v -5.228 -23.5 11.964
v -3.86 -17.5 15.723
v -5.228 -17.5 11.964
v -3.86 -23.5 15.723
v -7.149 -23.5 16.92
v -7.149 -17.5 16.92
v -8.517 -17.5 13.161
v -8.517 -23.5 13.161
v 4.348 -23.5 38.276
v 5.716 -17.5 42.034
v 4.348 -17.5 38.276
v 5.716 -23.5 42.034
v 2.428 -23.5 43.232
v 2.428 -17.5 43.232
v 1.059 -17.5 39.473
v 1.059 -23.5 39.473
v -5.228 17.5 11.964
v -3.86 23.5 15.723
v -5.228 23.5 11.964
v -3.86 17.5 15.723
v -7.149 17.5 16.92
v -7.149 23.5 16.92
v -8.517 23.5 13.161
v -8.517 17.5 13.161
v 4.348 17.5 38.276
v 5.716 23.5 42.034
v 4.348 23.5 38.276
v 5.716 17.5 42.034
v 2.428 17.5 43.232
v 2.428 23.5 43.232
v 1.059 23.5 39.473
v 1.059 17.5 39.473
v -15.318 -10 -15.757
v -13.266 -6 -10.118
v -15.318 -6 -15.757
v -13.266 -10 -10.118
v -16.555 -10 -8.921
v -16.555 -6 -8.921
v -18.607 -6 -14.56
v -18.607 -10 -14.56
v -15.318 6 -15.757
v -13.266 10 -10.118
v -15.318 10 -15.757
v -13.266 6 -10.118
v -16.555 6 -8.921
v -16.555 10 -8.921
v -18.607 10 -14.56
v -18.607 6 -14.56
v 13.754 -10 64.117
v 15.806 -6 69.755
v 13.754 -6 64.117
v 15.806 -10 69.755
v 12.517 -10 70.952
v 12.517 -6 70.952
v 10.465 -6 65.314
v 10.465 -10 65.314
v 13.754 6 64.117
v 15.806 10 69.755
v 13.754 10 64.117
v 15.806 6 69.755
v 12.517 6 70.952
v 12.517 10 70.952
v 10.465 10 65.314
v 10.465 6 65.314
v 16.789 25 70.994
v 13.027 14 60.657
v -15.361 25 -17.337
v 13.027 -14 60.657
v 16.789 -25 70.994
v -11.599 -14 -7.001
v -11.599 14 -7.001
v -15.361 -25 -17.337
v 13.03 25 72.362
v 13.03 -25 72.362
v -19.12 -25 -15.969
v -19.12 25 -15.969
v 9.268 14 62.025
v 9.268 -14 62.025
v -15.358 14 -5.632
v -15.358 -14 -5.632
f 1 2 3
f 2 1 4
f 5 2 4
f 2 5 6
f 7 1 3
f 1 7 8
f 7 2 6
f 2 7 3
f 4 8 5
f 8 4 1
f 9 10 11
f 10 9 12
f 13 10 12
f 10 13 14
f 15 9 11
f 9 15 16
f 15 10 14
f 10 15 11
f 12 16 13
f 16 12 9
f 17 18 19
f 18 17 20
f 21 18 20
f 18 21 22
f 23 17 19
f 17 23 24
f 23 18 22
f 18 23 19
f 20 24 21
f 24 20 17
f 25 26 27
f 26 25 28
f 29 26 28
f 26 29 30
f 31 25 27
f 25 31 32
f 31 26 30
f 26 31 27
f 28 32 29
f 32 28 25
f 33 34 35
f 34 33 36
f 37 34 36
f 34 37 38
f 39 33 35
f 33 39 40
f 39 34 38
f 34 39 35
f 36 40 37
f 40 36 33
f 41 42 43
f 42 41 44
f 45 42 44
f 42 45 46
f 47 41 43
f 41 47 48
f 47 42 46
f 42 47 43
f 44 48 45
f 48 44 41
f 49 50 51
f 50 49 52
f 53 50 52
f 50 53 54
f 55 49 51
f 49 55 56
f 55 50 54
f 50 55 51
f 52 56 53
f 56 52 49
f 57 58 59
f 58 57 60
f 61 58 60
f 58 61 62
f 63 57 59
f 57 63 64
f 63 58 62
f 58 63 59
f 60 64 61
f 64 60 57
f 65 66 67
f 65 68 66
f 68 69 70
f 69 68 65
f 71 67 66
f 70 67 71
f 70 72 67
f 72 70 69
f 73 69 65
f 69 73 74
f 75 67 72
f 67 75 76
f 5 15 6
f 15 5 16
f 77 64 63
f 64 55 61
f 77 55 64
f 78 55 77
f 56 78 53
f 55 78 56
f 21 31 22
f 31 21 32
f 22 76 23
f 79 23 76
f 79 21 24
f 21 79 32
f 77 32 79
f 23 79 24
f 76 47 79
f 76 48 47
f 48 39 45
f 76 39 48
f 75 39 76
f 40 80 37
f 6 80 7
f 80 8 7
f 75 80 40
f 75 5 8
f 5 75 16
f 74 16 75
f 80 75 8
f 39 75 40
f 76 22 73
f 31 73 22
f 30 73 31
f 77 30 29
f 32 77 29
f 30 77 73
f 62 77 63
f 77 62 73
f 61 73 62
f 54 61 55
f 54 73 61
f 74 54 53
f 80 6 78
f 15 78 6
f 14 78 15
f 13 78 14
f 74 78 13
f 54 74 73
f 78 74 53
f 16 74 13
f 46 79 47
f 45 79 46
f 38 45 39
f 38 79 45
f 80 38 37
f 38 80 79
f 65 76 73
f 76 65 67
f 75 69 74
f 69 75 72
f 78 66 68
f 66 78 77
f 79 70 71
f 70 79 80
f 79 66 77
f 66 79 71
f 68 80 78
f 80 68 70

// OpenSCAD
// 80 mm case fan -> 72 x 28 mm right-angle duct adapter
//
// Axis convention (matches request)
//   - Fan mounts to the flange in the XY plane at z = 0, air enters along +Z.
//   - The 90 degree turn is in the XZ plane, so the bend axis is Y.
//   - The 28 mm outlet side is parallel to that bend axis (Y).
//   - The 72 mm outlet side is the in-plane/radial dimension (Z at the outlet).
//   - Air exits along -X.
//
// The duct itself is one watertight polyhedron: outer skin + inner skin +
// annular caps. No boolean is needed to hollow it. The fan flange and outlet
// rim are simple CSG boxes added afterwards.

$fn = 64;

// ---------------- parameters ----------------
fan_hole_pitch = 71.5;   // standard 80 mm fan hole spacing
fan_hole_d     = 4.5;    // M4 clearance
fan_pad_r      = 6.5;    // corner pads so the M4 holes have material around them
fan_tie_w      = 6.0;    // zip-tie slot width
fan_tie_l      = 4.0;    // zip-tie slot length (1 mm web each side of flange)
fan_tie_pos    = 41.0;   // slot center distance from flange center
fan_tie_pair   = 9.0;    // ± offset of the two slots on each flange side

inlet_clear   = 76;      // clear square throat at fan
wall          = 2.0;     // duct wall thickness (5 perimeters at 0.4 mm nozzle)

flange_t      = 5;       // fan flange thickness
flange_outer  = 88;      // fan flange outer size

// M3 pilot holes for self-tapping screws in the fan corner pads (alternative
// to zip ties). Set to 0 to remove them.
fan_pilot_d       = 2.6;
fan_pilot_offset  = 4.8; // distance from M4 hole center, toward the flange edge

out_radial    = 72;      // outlet clear dim in bend plane (Z at outlet)
out_axis      = 28;      // outlet clear dim along bend axis (Y)
out_lip       = 10;      // straight run after arc

center_r      = 55;      // centerline bend radius
lead_in       = 12;      // vertical lead before arc
bend_angle    = 70;      // 90 - trim; stop 20 deg early -> min slope ~20 deg

rim_t         = 3;       // outlet rim thickness
rim_extra     = 9;       // rim overhang per side (gives 1.5 mm web around 6 mm slots)
rim_tie_pair_z = 14;     // ± Z offset of tie slots on the Y-side tabs
rim_tie_pair_y = 8;      // ± Y offset of tie slots on the Z-side tabs

n_straight    = 4;
n_bend        = 32;
n_out         = 4;
taper_exp     = 1.5;     // >1 keeps section large deeper into the bend

// ---------------- derived ----------------
in_half    = inlet_clear/2;
out_r_half = out_radial/2;
out_a_half = out_axis/2;

z_start   = flange_t - 1 + lead_in;   // arc start (duct overlaps flange)
th_end    = bend_angle * 3.14159265/180;
arc_end_x = -center_r + center_r*cos(th_end);
arc_end_z = z_start + center_r*sin(th_end);
outlet_x  = arc_end_x - out_lip*sin(th_end);
outlet_z  = arc_end_z + out_lip*cos(th_end);
rim_rot   = 90 - bend_angle;          // rim frame rotation about Y

// ---------------- path ----------------
// Section = [cx, cz, nx, nz, half_radial, half_axis]
// (nx,nz) = in-plane radial unit vector; tangent = (-nz, nx).
function path_sections(n) = [
    for (i=[0:n])
    let (
        ns=n_straight, nb=n_bend, no=n_out,
        seg = i < ns ? 0 : (i < ns+nb ? 1 : 2),
        u   = seg==0 ? i/ns : (seg==1 ? (i-ns)/nb : (i-ns-nb)/no),
        th  = seg==0 ? 0 : (seg==1 ? u*bend_angle : bend_angle),
        cx  = seg==0 ? 0
            : seg==1 ? -center_r + center_r*cos(th)
            : arc_end_x - out_lip*sin(th_end)*u,
        cz  = seg==0 ? z_start - lead_in*(1-u)
            : seg==1 ? z_start + center_r*sin(th)
            : arc_end_z + out_lip*cos(th_end)*u,
        nx  = seg==0 ? 1 : (seg==1 ? cos(th) : cos(th_end)),
        nz  = seg==0 ? 0 : (seg==1 ? sin(th) : sin(th_end)),
        g   = pow(u_global(i,ns,nb,no,n), taper_exp),
        hr  = in_half + (out_r_half - in_half)*g,
        ha  = in_half + (out_a_half - in_half)*g
    )
    [cx, cz, nx, nz, hr, ha]
];

function u_global(i,ns,nb,no,n) = i/n;

function corner(s,a,b,off) =
    [ s[0] + s[2]*a*(s[4]+off),
      b*(s[5]+off),
      s[1] + s[3]*a*(s[4]+off) ];

function ring_verts(sec,off) = [
    for (s=sec) each [
        corner(s,-1,-1,off), corner(s, 1,-1,off),
        corner(s, 1, 1,off), corner(s,-1, 1,off)
    ]
];

// Explicit triangles: non-planar quads on a curved path are triangulated here
// instead of relying on polyhedron's internal triangulation.
function tri_quad(a,b,c,d) = [[a,b,c],[a,c,d]];
function tri_quad_rev(a,b,c,d) = [[a,c,b],[a,d,c]];

function outer_faces(nr) = [
    for (i=[0:nr-2], j=[0:3])
    let (a=4*i+j, b=4*i+(j+1)%4,
         c=4*(i+1)+(j+1)%4, d=4*(i+1)+j)
    each tri_quad(a,b,c,d)
];

function inner_faces(nr) = [
    for (i=[0:nr-2], j=[0:3])
    let (o=4*nr, a=o+4*i+j, b=o+4*i+(j+1)%4,
         c=o+4*(i+1)+(j+1)%4, d=o+4*(i+1)+j)
    each tri_quad_rev(a,b,c,d)
];

function cap_faces(nr) = [
    for (j=[0:3])
    let (j2=(j+1)%4, o=4*nr,
         last=4*(nr-1), olast=o+last)
    each concat(
        tri_quad(o+j, o+j2, j2, j),              // inlet annulus, normal -t
        tri_quad(last+j, last+j2, olast+j2, olast+j)  // outlet annulus, +t
    )
];

module hollow_duct(sec) {
    nr = len(sec);
    polyhedron(
        concat(ring_verts(sec, wall), ring_verts(sec, 0)),
        concat(outer_faces(nr), inner_faces(nr), cap_faces(nr)),
        convex=false
    );
}

// ---------------- flange and rim ----------------
module fan_flange_base() {
    // Flange plate with the square throat cut out. Pads are added afterwards
    // so the mounting holes at the corners have material around them.
    difference() {
        translate([0,0,flange_t/2])
            cube([flange_outer, flange_outer, flange_t], center=true);
        translate([0,0,-1])
            cube([inlet_clear, inlet_clear, flange_t+2], center=true);
    }
}

module fan_pads() {
    for (sx=[-1,1], sy=[-1,1])
        translate([sx*fan_hole_pitch/2, sy*fan_hole_pitch/2, flange_t/2])
            cylinder(r=fan_pad_r, h=flange_t, center=true);
}

module fan_tie_slots() {
    // Two slots on each edge of the flange, through its thickness.
    // Y-facing edges: slot long axis radial (Y).
    for (sy=[-1,1], dx=[-1,1])
        translate([dx*fan_tie_pair, sy*fan_tie_pos, flange_t/2])
            cube([fan_tie_w, fan_tie_l, flange_t+2], center=true);
    // X-facing edges: slot long axis radial (X).
    for (sx=[-1,1], dy=[-1,1])
        translate([sx*fan_tie_pos, dy*fan_tie_pair, flange_t/2])
            cube([fan_tie_l, fan_tie_w, flange_t+2], center=true);
}

module fan_holes() {
    p = fan_hole_pitch/2;
    for (sx=[-1,1], sy=[-1,1]) {
        // Standard M4 clearance hole.
        translate([sx*p, sy*p, -1])
            cylinder(d=fan_hole_d, h=flange_t+2);
        // Optional M3 self-tapping pilot, angled out toward the flange corner.
        if (fan_pilot_d > 0)
            translate([sx*(p + fan_pilot_offset/sqrt(2)),
                       sy*(p + fan_pilot_offset/sqrt(2)), -1])
                cylinder(d=fan_pilot_d, h=flange_t+2);
    }
}

module fan_flange() {
    difference() {
        union() {
            fan_flange_base();
            fan_pads();
        }
        fan_holes();
        fan_tie_slots();
    }
}

module rim_tie_slots_local(ow, oh) {
    // Local frame: X = upstream normal, Y = bend axis, Z = radial at outlet.
    ytab = out_axis/2 + wall + rim_extra/2;
    ztab = out_radial/2 + wall + rim_extra/2;
    xc = -rim_t + 0.5;
    xlen = rim_t + 3;
    // Y-side tabs (parallel to the bend axis): slots long in local Z.
    for (sy=[-1,1], dz=[-1,1])
        translate([xc, sy*ytab, dz*rim_tie_pair_z])
            cube([xlen, fan_tie_w, fan_tie_l], center=true);
    // Z-side tabs (bend-plane sides): slots long in local Y.
    for (sz=[-1,1], dy=[-1,1])
        translate([xc, dy*rim_tie_pair_y, sz*ztab])
            cube([xlen, fan_tie_l, fan_tie_w], center=true);
}

module rim_local() {
    ow = out_axis + 2*wall + 2*rim_extra;   // Y
    oh = out_radial + 2*wall + 2*rim_extra; // local Z
    difference() {
        // local X from -rim_t to +1 (1 mm overlap with duct)
        translate([-rim_t, -ow/2, -oh/2])
            cube([rim_t+1, ow, oh], center=false);
        translate([-rim_t-1, -out_axis/2, -out_radial/2])
            cube([rim_t+3, out_axis, out_radial], center=false);
        rim_tie_slots_local(ow, oh);
    }
}

module outlet_rim() {
    translate([outlet_x, 0, outlet_z])
        rotate([0, rim_rot, 0])
            rim_local();
}

module adapter() {
    union() {
        hollow_duct(path_sections(n_straight+n_bend+n_out));
        fan_flange();
        outlet_rim();
    }
}


outlet_rim();
